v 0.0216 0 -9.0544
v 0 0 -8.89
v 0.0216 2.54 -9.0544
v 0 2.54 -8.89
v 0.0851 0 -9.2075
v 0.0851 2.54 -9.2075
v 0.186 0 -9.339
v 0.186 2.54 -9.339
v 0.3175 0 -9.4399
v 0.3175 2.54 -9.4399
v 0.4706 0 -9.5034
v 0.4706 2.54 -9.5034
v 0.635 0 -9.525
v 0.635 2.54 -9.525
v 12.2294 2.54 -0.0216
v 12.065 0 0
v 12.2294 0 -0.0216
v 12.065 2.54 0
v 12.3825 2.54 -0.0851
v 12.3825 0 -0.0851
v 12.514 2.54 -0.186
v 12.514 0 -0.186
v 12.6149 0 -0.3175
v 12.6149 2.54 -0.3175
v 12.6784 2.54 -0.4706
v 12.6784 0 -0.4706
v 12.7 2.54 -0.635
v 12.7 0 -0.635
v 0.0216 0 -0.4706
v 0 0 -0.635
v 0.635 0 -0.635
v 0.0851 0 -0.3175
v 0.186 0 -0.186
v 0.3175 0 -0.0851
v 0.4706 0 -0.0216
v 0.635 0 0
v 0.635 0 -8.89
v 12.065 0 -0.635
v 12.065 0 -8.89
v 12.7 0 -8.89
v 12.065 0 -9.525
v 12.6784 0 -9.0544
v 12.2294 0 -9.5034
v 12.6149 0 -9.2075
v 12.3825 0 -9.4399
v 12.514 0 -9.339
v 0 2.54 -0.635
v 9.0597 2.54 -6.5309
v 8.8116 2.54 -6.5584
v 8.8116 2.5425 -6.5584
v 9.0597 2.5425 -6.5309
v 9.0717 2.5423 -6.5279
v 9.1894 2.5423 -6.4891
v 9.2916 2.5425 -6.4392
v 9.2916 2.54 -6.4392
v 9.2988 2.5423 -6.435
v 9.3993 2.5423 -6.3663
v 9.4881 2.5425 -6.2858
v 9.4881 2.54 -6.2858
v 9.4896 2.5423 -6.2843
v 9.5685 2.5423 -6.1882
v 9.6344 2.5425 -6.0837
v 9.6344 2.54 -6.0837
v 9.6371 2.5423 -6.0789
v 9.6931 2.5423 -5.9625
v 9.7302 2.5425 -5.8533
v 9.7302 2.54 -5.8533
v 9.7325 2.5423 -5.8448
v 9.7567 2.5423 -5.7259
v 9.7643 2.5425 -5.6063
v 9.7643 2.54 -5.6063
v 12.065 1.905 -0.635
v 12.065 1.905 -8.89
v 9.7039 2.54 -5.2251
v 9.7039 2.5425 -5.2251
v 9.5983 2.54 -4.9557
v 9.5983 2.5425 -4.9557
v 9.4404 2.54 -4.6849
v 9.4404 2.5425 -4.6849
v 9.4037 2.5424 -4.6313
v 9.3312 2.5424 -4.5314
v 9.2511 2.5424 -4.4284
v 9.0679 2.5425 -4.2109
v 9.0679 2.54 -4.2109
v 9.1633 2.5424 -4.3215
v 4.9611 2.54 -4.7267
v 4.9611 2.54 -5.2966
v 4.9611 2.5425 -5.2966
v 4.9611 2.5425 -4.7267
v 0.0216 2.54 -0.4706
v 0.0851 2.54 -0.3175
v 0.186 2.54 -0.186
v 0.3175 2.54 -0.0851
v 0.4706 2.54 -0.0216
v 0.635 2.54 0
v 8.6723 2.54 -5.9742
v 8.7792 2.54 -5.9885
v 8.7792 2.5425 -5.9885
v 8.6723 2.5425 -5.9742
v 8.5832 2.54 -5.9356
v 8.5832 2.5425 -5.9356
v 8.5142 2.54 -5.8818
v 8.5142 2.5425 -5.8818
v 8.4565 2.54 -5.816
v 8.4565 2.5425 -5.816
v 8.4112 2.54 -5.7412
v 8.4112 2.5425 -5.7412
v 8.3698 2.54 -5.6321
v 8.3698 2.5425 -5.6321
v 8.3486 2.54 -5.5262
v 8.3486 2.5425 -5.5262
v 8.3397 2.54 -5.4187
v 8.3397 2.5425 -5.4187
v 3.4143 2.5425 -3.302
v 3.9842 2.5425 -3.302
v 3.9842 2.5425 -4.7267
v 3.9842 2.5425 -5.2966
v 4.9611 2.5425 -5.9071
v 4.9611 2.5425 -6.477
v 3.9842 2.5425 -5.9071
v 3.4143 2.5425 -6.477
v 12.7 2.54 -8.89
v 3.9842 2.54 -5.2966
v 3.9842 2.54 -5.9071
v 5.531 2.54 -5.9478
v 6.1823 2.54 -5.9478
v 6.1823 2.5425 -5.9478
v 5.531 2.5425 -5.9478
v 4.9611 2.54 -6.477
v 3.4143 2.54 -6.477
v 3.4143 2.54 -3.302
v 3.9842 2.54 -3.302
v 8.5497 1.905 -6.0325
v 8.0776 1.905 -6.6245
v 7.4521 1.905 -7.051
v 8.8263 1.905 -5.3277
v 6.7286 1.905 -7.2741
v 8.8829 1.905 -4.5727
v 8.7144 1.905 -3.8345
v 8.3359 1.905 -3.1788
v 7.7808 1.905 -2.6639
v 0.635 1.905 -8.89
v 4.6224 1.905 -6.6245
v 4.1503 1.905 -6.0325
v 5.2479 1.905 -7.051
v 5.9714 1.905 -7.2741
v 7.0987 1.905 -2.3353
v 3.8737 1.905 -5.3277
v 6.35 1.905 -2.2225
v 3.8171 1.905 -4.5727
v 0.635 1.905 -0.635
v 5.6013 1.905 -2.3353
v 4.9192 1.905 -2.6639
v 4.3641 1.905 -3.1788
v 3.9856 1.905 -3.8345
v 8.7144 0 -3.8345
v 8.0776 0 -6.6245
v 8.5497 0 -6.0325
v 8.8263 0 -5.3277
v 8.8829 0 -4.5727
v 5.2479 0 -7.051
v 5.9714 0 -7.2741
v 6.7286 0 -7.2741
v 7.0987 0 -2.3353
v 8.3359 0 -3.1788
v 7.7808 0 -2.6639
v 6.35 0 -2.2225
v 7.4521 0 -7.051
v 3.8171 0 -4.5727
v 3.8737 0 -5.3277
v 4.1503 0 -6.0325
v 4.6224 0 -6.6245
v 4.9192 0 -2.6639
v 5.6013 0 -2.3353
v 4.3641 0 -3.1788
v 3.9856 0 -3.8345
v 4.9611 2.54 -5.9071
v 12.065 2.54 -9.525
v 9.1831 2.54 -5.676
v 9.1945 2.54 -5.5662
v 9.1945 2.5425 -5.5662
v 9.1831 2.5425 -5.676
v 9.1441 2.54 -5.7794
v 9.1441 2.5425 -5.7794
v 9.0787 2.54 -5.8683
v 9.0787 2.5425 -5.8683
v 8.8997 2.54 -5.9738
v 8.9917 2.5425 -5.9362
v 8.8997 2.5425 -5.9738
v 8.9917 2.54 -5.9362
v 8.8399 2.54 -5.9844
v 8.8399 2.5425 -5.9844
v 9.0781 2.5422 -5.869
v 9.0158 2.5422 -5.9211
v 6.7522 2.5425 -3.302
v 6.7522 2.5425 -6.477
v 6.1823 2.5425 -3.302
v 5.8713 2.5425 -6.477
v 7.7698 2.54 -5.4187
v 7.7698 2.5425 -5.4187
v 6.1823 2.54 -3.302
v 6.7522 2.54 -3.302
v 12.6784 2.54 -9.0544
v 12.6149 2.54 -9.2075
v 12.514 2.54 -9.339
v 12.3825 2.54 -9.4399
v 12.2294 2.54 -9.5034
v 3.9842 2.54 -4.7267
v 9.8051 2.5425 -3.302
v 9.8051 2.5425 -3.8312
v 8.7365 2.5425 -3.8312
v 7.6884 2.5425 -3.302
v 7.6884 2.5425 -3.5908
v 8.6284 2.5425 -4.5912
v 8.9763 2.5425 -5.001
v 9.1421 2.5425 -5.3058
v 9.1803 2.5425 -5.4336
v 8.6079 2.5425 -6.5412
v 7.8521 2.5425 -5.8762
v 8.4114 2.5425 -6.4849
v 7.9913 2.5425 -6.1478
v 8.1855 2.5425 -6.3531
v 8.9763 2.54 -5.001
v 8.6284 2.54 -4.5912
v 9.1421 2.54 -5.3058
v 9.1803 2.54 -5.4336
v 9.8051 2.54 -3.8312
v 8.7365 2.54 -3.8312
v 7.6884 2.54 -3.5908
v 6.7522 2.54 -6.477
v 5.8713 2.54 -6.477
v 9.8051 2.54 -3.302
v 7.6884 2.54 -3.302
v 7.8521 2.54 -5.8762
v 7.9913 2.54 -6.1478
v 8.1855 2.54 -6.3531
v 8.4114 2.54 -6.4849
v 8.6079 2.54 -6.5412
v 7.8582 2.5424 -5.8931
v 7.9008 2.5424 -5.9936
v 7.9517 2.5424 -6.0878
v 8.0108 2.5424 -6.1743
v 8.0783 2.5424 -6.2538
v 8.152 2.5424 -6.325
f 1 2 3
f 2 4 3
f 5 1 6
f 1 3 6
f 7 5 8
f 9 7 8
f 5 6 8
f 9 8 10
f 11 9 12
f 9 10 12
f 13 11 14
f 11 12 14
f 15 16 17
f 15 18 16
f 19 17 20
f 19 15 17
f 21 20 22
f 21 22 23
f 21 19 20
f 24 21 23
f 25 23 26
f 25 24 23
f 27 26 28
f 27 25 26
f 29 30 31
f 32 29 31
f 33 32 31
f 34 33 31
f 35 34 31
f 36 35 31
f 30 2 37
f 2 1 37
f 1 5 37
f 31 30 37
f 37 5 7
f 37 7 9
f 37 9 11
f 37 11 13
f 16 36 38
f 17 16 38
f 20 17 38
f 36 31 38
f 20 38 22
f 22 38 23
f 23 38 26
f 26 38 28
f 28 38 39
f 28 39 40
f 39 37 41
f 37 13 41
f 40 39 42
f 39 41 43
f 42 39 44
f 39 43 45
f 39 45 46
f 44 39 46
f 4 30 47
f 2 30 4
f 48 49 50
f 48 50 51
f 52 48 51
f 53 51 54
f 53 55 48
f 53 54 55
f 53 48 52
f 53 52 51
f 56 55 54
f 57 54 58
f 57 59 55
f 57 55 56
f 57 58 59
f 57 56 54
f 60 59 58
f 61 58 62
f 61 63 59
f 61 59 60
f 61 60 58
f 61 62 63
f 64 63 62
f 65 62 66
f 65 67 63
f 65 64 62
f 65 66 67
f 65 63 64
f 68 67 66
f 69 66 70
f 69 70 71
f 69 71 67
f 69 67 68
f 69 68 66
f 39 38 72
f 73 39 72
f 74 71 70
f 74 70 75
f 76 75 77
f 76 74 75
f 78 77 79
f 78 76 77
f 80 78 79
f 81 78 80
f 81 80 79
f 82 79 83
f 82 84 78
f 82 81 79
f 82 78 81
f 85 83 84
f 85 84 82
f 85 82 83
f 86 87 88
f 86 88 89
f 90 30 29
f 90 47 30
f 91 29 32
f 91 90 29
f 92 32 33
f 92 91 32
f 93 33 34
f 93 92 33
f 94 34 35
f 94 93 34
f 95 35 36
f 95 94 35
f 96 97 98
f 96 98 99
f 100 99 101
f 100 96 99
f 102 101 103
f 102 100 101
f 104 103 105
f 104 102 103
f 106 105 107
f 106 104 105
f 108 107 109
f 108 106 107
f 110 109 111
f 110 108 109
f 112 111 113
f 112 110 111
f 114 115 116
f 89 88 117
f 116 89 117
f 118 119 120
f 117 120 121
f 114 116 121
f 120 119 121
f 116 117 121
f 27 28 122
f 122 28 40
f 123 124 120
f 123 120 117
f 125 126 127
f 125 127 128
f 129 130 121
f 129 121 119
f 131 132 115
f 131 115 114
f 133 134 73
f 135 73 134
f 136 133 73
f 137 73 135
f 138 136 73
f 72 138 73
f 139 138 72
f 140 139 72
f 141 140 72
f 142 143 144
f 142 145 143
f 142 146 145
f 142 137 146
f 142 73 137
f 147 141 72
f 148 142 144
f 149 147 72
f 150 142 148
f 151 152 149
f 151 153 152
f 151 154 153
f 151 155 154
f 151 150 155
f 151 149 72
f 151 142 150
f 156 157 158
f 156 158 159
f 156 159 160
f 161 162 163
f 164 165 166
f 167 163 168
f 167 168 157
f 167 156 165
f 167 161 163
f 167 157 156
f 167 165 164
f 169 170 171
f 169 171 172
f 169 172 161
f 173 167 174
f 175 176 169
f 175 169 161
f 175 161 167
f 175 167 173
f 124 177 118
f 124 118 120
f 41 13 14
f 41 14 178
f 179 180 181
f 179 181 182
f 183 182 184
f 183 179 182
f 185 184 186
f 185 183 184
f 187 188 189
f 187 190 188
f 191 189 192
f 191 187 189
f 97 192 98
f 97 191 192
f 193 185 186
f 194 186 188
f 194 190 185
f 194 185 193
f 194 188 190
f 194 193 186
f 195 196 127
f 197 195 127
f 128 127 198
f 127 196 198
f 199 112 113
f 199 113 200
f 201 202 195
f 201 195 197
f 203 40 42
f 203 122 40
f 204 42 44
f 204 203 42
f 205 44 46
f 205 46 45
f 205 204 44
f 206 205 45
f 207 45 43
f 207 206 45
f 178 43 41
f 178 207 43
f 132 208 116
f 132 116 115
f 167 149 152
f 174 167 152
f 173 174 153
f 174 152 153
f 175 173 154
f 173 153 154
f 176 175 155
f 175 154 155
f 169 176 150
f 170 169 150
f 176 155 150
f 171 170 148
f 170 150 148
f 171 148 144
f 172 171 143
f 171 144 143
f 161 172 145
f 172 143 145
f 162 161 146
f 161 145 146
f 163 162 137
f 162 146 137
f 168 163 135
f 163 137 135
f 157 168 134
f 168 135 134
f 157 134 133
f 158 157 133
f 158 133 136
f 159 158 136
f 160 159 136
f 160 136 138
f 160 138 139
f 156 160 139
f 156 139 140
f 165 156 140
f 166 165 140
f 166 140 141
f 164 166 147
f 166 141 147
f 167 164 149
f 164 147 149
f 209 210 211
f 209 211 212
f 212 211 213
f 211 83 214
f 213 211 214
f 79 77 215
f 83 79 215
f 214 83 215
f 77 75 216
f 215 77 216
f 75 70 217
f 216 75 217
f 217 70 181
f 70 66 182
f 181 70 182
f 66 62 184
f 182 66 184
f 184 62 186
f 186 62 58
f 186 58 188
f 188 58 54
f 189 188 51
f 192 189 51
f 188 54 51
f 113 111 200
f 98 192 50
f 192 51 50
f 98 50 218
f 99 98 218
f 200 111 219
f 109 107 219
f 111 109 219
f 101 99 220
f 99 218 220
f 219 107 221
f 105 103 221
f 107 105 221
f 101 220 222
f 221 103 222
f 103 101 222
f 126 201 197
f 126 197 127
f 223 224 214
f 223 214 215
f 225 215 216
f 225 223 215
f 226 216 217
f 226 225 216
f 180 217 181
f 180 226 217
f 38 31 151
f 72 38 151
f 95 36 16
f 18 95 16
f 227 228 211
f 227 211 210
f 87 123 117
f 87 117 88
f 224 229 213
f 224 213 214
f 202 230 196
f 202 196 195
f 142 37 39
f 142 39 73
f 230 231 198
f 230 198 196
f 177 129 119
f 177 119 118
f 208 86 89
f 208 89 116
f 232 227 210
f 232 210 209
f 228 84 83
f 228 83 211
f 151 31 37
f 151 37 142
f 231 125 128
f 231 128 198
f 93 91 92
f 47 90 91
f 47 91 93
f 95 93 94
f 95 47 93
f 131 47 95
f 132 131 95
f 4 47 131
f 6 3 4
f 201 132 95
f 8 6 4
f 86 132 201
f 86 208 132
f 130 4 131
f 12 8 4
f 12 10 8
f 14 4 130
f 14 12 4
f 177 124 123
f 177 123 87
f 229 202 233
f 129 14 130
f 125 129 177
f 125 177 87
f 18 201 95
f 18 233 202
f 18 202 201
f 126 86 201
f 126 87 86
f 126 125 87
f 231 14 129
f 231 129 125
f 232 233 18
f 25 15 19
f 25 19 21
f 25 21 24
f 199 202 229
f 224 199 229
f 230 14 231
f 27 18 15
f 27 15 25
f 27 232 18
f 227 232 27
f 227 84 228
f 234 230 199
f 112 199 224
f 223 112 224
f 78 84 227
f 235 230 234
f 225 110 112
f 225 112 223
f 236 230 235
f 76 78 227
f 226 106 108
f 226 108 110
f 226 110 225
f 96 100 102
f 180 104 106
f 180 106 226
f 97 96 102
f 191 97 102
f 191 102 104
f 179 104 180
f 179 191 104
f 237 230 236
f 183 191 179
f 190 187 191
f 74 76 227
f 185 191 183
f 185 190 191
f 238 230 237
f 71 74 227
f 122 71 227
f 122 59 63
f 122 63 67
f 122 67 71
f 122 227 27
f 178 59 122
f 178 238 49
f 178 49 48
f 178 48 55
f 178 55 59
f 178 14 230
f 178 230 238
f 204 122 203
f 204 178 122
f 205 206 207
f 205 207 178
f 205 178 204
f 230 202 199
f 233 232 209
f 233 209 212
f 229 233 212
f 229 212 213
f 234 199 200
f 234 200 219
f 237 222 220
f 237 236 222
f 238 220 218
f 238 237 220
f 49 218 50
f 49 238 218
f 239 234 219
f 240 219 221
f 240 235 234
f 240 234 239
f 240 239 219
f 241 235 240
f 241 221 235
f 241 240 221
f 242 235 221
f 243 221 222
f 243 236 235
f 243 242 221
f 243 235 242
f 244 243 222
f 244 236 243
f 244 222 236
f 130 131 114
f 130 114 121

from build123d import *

# Parameters (mm, degrees)
SKETCH1_W           = 12.7
SKETCH1_H           = 9.525
BOSS_EXTRUDE1_DEPTH = 2.54
FILLET1_R           = 0.635
SHELL1_START        = 0.635
SHELL1_OUTLINE_W    = 1.905
SHELL1_OUTLINE_H    = 8.255
SHELL1_DEPTH        = 11.43
SKETCH2_R           = 2.54
BOSS_EXTRUDE2_DEPTH = 1.905
BOSS_EXTRUDE3_DEPTH = 0.00254


# Read off the part's stored shape, not the designer's step: Shell1
with BuildPart() as part:
    # Sketch1 → Boss-Extrude1 (new body)
    with BuildSketch(Plane(origin=(0, 0, 0), x_dir=(1, 0, 0), z_dir=(0, 1, 0))):
        with Locations((6.35, 4.7625)):
            Rectangle(SKETCH1_W, SKETCH1_H)
    extrude(amount=BOSS_EXTRUDE1_DEPTH)

    # Fillet1
    fillet1_edges = [part.edges().sort_by_distance(p)[0] for p in [
        (0, 1.27, -9.525),
        (12.7, 1.27, -9.525),
        (12.7, 1.27, 0),
        (0, 1.27, 0),
    ]]
    fillet(fillet1_edges, radius=FILLET1_R)

    # Shell1 outline → Shell1 (cut)
    with BuildSketch(Plane.YZ.offset(SHELL1_START)):
        with Locations((0.9525, -4.7625)):
            Rectangle(SHELL1_OUTLINE_W, SHELL1_OUTLINE_H)
    extrude(amount=SHELL1_DEPTH, mode=Mode.SUBTRACT)

    # Sketch2 → Boss-Extrude2 (add)
    with BuildSketch(Plane(origin=(0, 1.905, 0), x_dir=(-1, 0, 0), z_dir=(0, -1, 0))):
        with Locations(Location((-6.35, 4.7625, 0), (0, 0, 270))):
            Circle(SKETCH2_R)
    extrude(amount=BOSS_EXTRUDE2_DEPTH)

    # Sketch3 → Boss-Extrude3 (add)
    with BuildSketch(Plane(origin=(0, 2.54, 0), x_dir=(1, 0, 0), z_dir=(0, 1, 0))):
        Polygon((3.414346154, 6.477), (4.961141026, 6.477), (4.961141026, 5.907128205), (3.984217949, 5.907128205), (3.984217949, 5.296551282), (4.961141026, 5.296551282), (4.961141026, 4.726679487), (3.984217949, 4.726679487), (3.984217949, 3.302), (3.414346154, 3.302), align=None)
        Polygon((5.871282252, 6.477), (6.752166667, 6.477), (6.752166667, 3.302), (6.182294872, 3.302), (6.182294872, 5.947833333), (5.531012821, 5.947833333), align=None)
        with BuildLine():
            Line((8.339666667, 5.418666667), (7.769794872, 5.418666667))
            add(Edge.make_bspline(
                [(7.769794872, 5.418666667), (7.772256061, 5.461774453), (7.777065076, 5.54600448), (7.796194123, 5.66835129), (7.82182639, 5.783955572), (7.856036054, 5.89241293), (7.899022734, 5.993683952), (7.949680273, 6.088113879), (8.009302856, 6.175205533), (8.076621518, 6.254538911), (8.150493374, 6.325709616), (8.229384771, 6.388814034), (8.31450246, 6.440886212), (8.404291271, 6.483736794), (8.498735915, 6.517972417), (8.598729985, 6.540861702), (8.70340768, 6.55636255), (8.775068039, 6.557718936), (8.811591747, 6.558410256)],
                knots=[0, 0, 0, 0, 1.199038563, 2.342849363, 3.436047546, 4.486744587, 5.497670872, 6.488682221, 7.459191391, 8.424610317, 9.374430501, 10.305433194, 11.225809216, 12.140057399, 13.06607119, 14.010487599, 14.985989317, 16, 16, 16, 16], degree=3))
            add(Edge.make_bspline(
                [(8.811591747, 6.558410256), (8.85642408, 6.557011369), (8.9439473, 6.554280414), (9.071125482, 6.53098446), (9.189895998, 6.492018376), (9.300172515, 6.437572481), (9.401016227, 6.368404679), (9.492410414, 6.285933395), (9.571591168, 6.188428338), (9.639060519, 6.079946535), (9.695119486, 5.965079574), (9.734403276, 5.846302372), (9.760224087, 5.726766795), (9.762978037, 5.646277588), (9.764346154, 5.606291867)],
                knots=[0, 0, 0, 0, 1.075374347, 2.099382735, 3.09057751, 4.06680945, 5.040638231, 6.016817125, 7.011024321, 8.044445721, 9.0776792, 10.070479129, 11.0414456, 12, 12, 12, 12], degree=3))
            add(Edge.make_bspline(
                [(9.764346154, 5.606291867), (9.763813481, 5.582105677), (9.762741343, 5.53342485), (9.755286624, 5.459758812), (9.744103072, 5.384721339), (9.727241001, 5.308376769), (9.706212616, 5.230703702), (9.680702146, 5.151469689), (9.65011785, 5.071123958), (9.614970118, 4.98876223), (9.573038785, 4.904117111), (9.524215575, 4.815919737), (9.467204612, 4.724248345), (9.402694514, 4.62858533), (9.330371972, 4.529081566), (9.249883932, 4.426036789), (9.162157425, 4.319087904), (9.099895456, 4.247598577), (9.067906851, 4.210869191)],
                knots=[0, 0, 0, 0, 0.728284026, 1.46585585, 2.227944881, 3.01186502, 3.81876927, 4.650621989, 5.517437689, 6.406905708, 7.346299482, 8.360816762, 9.441613733, 10.596154504, 11.834900912, 13.145207542, 14.533280747, 16, 16, 16, 16], degree=3))
            Line((9.067906851, 4.210869191), (8.736541667, 3.831166667))
            Line((8.736541667, 3.831166667), (9.805051282, 3.831166667))
            Line((9.805051282, 3.831166667), (9.805051282, 3.302))
            Line((9.805051282, 3.302), (7.688384615, 3.302))
            Line((7.688384615, 3.302), (7.688384615, 3.590752003))
            Line((7.688384615, 3.590752003), (8.62841867, 4.591207732))
            add(Edge.make_bspline(
                [(8.62841867, 4.591207732), (8.655635071, 4.620391337), (8.70834517, 4.676911324), (8.783346208, 4.759916937), (8.851215523, 4.838687284), (8.910545788, 4.914061108), (8.96445058, 4.983593589), (9.010526288, 5.049380524), (9.049194469, 5.110827174), (9.091174264, 5.184921103), (9.131041269, 5.273291298), (9.167621659, 5.375097387), (9.189919938, 5.47240056), (9.192997806, 5.5358054), (9.194474359, 5.566222756)],
                knots=[0, 0, 0, 0, 1.246127091, 2.413378631, 3.493388633, 4.492180848, 5.408488754, 6.240484944, 6.999099869, 7.674939598, 8.898438119, 10.020720584, 11.050475521, 12, 12, 12, 12], degree=3))
            add(Edge.make_bspline(
                [(9.194474359, 5.566222756), (9.193370376, 5.595649202), (9.191231232, 5.652667658), (9.167723774, 5.733776109), (9.131305205, 5.807211531), (9.079986297, 5.870779591), (9.017823027, 5.923017682), (8.945987529, 5.961870906), (8.865065475, 5.984289038), (8.808337572, 5.987094988), (8.779154848, 5.988538462)],
                knots=[0, 0, 0, 0, 1.062038974, 2.057870785, 3.028805853, 4.01125022, 4.991535629, 5.949134679, 6.94496649, 8, 8, 8, 8], degree=3))
            add(Edge.make_bspline(
                [(8.779154848, 5.988538462), (8.764078681, 5.988005225), (8.734398824, 5.986955463), (8.690771755, 5.979967483), (8.649257465, 5.967651898), (8.609393876, 5.951150747), (8.571606422, 5.929278353), (8.535990417, 5.902317143), (8.5021706, 5.870952262), (8.470302083, 5.835281784), (8.441297572, 5.79547352), (8.415535872, 5.751891037), (8.394235234, 5.704561389), (8.375481378, 5.654109398), (8.361017507, 5.59999317), (8.350486015, 5.542536583), (8.342479625, 5.481833113), (8.340621377, 5.440105185), (8.339666667, 5.418666667)],
                knots=[0, 0, 0, 0, 0.903469896, 1.778625579, 2.63899355, 3.493148037, 4.358286772, 5.247621495, 6.164656832, 7.118446693, 8.109501108, 9.111810964, 10.146451449, 11.215617525, 12.33435995, 13.498009769, 14.714554818, 16, 16, 16, 16], degree=3))
        make_face()
    extrude(amount=BOSS_EXTRUDE3_DEPTH)


solid = part.part
